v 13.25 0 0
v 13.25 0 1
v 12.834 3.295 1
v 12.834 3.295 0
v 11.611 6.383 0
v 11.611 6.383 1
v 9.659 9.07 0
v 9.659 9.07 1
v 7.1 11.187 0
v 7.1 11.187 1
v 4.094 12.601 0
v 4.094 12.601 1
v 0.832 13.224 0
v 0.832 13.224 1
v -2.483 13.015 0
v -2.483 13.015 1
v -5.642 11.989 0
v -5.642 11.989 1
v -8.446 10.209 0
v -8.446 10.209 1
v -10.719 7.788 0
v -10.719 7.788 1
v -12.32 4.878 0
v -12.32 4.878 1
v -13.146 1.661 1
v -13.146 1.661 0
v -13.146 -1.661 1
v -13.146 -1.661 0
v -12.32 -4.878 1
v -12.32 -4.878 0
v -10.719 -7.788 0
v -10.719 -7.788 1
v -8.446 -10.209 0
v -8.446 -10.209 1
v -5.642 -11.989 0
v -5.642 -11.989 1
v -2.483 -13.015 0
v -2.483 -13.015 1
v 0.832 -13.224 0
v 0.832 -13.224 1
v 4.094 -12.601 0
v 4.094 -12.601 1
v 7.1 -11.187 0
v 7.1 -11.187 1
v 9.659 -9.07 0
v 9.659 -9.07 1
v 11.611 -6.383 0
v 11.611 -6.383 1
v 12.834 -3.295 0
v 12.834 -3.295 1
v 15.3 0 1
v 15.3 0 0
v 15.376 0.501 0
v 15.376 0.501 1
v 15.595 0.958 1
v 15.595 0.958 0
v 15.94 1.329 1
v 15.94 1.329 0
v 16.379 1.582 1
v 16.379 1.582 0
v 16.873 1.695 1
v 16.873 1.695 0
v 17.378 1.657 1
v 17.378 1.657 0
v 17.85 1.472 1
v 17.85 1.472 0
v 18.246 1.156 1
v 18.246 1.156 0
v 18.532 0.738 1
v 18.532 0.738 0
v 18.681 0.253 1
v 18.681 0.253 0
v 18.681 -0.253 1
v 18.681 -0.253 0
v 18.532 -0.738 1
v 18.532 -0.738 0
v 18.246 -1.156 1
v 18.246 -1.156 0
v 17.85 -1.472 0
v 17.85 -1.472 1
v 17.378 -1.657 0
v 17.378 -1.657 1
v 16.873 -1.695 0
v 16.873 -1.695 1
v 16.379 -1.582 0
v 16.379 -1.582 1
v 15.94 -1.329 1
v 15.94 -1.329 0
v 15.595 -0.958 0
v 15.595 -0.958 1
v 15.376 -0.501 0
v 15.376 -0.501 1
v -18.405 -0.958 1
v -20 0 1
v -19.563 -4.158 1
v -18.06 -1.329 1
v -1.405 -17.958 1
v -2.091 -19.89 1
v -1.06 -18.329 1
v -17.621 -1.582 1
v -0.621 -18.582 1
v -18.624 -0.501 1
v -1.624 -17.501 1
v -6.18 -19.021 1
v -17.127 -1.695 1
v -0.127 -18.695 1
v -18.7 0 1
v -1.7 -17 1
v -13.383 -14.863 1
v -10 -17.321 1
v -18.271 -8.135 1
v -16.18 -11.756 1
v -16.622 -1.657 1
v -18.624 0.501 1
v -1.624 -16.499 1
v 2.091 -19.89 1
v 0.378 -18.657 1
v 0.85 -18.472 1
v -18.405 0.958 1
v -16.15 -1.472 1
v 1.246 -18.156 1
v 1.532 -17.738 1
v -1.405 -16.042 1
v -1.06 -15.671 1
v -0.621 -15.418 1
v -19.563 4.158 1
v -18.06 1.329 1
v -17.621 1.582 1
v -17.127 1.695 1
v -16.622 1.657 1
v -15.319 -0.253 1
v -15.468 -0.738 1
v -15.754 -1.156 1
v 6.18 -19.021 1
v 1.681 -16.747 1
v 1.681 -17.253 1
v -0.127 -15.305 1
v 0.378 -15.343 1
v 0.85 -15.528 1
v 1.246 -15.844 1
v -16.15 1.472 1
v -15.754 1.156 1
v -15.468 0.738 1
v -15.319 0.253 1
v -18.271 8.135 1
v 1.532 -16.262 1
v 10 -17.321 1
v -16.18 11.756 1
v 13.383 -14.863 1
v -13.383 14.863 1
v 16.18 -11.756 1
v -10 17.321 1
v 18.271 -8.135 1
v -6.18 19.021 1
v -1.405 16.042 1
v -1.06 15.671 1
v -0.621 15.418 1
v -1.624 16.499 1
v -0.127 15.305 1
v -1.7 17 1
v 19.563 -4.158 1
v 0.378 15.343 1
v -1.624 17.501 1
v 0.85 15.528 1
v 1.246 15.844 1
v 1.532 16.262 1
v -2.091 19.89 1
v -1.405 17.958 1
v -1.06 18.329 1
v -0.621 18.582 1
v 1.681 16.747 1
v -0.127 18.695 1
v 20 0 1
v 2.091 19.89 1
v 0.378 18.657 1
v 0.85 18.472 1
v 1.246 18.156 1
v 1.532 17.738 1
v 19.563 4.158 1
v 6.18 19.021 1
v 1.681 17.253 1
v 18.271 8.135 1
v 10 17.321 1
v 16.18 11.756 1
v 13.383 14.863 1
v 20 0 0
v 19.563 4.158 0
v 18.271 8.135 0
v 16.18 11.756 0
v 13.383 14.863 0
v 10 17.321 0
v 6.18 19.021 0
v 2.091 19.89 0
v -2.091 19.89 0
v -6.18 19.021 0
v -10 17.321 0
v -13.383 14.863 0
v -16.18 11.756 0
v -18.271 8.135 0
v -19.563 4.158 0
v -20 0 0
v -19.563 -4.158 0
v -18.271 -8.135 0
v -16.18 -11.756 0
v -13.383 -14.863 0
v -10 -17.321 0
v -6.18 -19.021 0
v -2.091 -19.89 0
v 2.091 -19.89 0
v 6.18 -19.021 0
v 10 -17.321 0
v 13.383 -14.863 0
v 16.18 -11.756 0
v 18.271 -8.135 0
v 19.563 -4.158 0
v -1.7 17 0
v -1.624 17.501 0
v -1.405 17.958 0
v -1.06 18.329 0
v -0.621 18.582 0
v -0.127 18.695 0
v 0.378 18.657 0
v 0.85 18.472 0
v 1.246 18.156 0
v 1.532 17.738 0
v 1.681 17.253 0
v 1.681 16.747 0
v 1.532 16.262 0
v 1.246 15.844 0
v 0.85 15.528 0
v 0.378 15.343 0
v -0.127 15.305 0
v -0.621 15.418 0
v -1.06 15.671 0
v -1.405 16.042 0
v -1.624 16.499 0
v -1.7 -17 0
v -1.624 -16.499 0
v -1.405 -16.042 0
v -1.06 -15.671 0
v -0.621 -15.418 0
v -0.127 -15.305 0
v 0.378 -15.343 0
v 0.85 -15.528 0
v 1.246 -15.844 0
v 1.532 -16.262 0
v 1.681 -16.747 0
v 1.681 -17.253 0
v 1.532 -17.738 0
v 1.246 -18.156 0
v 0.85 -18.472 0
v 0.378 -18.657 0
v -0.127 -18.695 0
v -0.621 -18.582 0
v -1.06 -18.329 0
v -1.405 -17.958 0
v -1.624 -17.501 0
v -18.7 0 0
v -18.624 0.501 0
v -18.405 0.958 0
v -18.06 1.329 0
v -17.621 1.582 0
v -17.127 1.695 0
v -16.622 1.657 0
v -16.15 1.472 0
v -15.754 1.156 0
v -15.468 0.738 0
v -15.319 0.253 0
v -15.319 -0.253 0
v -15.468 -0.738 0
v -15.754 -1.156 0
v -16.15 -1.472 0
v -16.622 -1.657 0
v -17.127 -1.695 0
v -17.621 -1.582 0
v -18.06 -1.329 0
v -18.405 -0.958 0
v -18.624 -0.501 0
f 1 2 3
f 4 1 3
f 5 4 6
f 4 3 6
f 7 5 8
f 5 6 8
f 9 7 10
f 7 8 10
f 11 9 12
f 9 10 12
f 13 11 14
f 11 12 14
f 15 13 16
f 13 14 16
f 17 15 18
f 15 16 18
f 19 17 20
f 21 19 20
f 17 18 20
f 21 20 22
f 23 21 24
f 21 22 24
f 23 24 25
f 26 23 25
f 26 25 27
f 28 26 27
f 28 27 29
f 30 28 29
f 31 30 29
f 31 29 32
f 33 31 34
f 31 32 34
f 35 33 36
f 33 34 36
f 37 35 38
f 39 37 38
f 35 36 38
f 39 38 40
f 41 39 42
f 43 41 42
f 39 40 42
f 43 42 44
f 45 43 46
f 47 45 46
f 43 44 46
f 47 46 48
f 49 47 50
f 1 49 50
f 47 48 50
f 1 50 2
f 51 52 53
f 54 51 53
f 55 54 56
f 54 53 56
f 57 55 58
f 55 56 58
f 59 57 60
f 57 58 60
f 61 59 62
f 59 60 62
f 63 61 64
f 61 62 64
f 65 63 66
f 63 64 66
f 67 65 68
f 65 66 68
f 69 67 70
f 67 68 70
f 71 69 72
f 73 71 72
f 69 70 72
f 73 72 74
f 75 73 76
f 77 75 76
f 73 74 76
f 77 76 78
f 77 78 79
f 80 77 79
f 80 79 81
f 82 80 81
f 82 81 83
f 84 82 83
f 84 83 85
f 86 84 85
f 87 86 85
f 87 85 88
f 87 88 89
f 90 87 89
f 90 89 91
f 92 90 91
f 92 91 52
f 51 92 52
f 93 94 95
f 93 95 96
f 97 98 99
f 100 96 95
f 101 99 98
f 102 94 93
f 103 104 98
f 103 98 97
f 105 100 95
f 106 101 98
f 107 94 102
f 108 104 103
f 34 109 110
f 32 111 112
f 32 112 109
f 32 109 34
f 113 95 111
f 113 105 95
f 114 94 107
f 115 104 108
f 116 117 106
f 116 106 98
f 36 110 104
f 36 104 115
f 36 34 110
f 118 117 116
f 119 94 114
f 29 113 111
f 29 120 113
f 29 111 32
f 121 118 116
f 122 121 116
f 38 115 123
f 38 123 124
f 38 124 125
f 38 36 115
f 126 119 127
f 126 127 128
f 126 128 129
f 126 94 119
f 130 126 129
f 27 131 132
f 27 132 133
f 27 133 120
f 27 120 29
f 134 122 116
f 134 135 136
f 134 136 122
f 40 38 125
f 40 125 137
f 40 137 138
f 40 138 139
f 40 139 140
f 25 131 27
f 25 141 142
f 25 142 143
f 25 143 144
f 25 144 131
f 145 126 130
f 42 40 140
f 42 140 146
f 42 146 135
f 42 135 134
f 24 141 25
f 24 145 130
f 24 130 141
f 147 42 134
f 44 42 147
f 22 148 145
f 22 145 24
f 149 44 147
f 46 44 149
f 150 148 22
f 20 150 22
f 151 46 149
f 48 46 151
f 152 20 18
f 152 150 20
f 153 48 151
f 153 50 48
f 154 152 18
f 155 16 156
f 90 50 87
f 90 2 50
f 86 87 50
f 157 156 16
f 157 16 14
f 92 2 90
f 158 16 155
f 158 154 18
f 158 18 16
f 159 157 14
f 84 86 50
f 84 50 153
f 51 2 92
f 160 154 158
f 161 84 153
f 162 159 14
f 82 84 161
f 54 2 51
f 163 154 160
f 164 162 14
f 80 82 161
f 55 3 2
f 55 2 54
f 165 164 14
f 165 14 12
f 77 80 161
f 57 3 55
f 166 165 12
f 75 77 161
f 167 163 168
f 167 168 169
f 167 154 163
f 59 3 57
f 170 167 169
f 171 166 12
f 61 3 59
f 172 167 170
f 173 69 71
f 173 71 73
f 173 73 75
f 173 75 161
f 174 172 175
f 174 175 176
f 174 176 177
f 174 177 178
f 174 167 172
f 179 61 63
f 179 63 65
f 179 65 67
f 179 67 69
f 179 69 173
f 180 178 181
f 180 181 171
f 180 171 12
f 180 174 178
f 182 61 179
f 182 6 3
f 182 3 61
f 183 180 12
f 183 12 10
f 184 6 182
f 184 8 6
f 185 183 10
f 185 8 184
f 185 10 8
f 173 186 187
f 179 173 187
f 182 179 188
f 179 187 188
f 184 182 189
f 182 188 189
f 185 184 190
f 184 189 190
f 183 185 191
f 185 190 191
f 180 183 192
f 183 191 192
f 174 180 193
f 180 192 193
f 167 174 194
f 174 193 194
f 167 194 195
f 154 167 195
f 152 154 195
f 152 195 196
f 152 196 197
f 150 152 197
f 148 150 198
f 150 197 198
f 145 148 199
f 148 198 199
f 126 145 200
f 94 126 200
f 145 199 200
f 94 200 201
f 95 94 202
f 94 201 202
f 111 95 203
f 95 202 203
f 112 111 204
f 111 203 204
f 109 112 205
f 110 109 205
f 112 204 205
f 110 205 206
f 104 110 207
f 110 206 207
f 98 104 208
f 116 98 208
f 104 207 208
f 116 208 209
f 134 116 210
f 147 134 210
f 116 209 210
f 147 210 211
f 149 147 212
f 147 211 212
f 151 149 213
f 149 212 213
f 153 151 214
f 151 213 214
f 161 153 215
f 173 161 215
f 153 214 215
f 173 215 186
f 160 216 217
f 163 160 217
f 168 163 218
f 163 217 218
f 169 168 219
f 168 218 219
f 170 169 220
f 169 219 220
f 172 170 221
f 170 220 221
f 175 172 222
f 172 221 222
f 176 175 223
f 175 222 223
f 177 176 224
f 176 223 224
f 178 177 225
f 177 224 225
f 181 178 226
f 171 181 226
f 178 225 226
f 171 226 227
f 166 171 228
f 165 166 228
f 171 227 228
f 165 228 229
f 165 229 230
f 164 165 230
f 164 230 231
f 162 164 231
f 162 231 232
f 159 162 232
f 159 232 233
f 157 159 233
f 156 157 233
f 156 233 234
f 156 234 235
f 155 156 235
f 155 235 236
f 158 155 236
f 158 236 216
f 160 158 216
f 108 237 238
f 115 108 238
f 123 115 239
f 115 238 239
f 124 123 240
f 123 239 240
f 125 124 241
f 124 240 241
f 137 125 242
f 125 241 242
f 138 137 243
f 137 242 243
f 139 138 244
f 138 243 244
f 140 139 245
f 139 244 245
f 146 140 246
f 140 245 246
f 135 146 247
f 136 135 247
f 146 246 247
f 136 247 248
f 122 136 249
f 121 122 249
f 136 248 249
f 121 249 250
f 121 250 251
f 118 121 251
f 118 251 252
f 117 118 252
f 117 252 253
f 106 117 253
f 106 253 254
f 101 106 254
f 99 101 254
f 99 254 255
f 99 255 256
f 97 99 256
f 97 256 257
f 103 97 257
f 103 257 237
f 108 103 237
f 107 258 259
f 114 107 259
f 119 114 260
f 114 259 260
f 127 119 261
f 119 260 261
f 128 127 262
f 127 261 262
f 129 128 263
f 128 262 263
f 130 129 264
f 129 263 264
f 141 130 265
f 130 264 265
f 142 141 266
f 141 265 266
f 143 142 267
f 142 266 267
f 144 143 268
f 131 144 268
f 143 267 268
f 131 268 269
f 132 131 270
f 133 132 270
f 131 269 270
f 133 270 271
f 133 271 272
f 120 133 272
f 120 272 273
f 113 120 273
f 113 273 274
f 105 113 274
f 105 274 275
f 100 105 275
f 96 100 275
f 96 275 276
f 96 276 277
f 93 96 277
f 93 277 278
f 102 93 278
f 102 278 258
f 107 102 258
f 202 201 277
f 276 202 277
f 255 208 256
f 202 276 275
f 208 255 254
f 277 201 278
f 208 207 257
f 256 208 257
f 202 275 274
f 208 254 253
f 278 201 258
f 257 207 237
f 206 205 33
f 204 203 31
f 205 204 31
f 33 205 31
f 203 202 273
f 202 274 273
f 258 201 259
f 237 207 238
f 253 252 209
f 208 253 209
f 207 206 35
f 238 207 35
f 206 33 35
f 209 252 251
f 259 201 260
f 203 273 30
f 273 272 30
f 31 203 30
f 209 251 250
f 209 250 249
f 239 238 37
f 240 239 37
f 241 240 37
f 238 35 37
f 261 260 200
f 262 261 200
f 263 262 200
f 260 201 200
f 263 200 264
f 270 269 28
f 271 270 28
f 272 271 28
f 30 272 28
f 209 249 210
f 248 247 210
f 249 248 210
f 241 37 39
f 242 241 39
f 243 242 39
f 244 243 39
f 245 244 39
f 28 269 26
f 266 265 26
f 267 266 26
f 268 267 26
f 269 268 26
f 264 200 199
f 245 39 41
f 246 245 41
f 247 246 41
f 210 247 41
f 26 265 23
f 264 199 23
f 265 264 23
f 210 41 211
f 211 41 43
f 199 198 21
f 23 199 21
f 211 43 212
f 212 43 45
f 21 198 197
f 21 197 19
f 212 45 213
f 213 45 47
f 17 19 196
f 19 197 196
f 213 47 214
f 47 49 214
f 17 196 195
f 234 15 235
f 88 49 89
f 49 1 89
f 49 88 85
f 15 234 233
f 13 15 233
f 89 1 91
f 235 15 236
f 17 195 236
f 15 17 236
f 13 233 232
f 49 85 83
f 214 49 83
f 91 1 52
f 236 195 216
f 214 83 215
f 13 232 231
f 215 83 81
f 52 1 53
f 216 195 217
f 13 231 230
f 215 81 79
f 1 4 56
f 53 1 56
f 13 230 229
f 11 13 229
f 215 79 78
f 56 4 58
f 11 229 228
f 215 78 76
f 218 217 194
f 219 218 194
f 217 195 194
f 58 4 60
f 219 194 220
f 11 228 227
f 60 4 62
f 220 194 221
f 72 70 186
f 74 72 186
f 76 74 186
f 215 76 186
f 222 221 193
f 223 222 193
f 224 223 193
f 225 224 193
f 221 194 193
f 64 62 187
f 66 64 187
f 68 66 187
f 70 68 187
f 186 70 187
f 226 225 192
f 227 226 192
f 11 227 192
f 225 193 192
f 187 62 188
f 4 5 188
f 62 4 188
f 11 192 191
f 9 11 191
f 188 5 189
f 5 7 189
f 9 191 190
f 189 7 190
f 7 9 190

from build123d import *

# Parameters (mm, degrees)
SKETCH1_R                   = 20
BOSS_EXTRUDE1_DEPTH         = 1
SKETCH2_R                   = 13.25
CUT_EXTRUDE1_DEPTH          = 1
TAP_DRILL_FOR_M3X0_5_TAP1_D = 3.4


with BuildPart() as part:
    # Sketch1 → Boss-Extrude1 (new body)
    with BuildSketch(Plane.XY):
        Circle(SKETCH1_R)
    extrude(amount=BOSS_EXTRUDE1_DEPTH)

    # Sketch2 → Cut-Extrude1 (cut)
    with BuildSketch(Plane.XY.offset(1)):
        Circle(SKETCH2_R)
    extrude(amount=-CUT_EXTRUDE1_DEPTH, mode=Mode.SUBTRACT)

    # Tap Drill for M3x0.5 Tap1 (through all)
    with Locations(Plane.XY.offset(1)):
        with Locations((0, 17), (17, 0), (0, -17), (-17, 0)):
            Hole(TAP_DRILL_FOR_M3X0_5_TAP1_D / 2)


solid = part.part
